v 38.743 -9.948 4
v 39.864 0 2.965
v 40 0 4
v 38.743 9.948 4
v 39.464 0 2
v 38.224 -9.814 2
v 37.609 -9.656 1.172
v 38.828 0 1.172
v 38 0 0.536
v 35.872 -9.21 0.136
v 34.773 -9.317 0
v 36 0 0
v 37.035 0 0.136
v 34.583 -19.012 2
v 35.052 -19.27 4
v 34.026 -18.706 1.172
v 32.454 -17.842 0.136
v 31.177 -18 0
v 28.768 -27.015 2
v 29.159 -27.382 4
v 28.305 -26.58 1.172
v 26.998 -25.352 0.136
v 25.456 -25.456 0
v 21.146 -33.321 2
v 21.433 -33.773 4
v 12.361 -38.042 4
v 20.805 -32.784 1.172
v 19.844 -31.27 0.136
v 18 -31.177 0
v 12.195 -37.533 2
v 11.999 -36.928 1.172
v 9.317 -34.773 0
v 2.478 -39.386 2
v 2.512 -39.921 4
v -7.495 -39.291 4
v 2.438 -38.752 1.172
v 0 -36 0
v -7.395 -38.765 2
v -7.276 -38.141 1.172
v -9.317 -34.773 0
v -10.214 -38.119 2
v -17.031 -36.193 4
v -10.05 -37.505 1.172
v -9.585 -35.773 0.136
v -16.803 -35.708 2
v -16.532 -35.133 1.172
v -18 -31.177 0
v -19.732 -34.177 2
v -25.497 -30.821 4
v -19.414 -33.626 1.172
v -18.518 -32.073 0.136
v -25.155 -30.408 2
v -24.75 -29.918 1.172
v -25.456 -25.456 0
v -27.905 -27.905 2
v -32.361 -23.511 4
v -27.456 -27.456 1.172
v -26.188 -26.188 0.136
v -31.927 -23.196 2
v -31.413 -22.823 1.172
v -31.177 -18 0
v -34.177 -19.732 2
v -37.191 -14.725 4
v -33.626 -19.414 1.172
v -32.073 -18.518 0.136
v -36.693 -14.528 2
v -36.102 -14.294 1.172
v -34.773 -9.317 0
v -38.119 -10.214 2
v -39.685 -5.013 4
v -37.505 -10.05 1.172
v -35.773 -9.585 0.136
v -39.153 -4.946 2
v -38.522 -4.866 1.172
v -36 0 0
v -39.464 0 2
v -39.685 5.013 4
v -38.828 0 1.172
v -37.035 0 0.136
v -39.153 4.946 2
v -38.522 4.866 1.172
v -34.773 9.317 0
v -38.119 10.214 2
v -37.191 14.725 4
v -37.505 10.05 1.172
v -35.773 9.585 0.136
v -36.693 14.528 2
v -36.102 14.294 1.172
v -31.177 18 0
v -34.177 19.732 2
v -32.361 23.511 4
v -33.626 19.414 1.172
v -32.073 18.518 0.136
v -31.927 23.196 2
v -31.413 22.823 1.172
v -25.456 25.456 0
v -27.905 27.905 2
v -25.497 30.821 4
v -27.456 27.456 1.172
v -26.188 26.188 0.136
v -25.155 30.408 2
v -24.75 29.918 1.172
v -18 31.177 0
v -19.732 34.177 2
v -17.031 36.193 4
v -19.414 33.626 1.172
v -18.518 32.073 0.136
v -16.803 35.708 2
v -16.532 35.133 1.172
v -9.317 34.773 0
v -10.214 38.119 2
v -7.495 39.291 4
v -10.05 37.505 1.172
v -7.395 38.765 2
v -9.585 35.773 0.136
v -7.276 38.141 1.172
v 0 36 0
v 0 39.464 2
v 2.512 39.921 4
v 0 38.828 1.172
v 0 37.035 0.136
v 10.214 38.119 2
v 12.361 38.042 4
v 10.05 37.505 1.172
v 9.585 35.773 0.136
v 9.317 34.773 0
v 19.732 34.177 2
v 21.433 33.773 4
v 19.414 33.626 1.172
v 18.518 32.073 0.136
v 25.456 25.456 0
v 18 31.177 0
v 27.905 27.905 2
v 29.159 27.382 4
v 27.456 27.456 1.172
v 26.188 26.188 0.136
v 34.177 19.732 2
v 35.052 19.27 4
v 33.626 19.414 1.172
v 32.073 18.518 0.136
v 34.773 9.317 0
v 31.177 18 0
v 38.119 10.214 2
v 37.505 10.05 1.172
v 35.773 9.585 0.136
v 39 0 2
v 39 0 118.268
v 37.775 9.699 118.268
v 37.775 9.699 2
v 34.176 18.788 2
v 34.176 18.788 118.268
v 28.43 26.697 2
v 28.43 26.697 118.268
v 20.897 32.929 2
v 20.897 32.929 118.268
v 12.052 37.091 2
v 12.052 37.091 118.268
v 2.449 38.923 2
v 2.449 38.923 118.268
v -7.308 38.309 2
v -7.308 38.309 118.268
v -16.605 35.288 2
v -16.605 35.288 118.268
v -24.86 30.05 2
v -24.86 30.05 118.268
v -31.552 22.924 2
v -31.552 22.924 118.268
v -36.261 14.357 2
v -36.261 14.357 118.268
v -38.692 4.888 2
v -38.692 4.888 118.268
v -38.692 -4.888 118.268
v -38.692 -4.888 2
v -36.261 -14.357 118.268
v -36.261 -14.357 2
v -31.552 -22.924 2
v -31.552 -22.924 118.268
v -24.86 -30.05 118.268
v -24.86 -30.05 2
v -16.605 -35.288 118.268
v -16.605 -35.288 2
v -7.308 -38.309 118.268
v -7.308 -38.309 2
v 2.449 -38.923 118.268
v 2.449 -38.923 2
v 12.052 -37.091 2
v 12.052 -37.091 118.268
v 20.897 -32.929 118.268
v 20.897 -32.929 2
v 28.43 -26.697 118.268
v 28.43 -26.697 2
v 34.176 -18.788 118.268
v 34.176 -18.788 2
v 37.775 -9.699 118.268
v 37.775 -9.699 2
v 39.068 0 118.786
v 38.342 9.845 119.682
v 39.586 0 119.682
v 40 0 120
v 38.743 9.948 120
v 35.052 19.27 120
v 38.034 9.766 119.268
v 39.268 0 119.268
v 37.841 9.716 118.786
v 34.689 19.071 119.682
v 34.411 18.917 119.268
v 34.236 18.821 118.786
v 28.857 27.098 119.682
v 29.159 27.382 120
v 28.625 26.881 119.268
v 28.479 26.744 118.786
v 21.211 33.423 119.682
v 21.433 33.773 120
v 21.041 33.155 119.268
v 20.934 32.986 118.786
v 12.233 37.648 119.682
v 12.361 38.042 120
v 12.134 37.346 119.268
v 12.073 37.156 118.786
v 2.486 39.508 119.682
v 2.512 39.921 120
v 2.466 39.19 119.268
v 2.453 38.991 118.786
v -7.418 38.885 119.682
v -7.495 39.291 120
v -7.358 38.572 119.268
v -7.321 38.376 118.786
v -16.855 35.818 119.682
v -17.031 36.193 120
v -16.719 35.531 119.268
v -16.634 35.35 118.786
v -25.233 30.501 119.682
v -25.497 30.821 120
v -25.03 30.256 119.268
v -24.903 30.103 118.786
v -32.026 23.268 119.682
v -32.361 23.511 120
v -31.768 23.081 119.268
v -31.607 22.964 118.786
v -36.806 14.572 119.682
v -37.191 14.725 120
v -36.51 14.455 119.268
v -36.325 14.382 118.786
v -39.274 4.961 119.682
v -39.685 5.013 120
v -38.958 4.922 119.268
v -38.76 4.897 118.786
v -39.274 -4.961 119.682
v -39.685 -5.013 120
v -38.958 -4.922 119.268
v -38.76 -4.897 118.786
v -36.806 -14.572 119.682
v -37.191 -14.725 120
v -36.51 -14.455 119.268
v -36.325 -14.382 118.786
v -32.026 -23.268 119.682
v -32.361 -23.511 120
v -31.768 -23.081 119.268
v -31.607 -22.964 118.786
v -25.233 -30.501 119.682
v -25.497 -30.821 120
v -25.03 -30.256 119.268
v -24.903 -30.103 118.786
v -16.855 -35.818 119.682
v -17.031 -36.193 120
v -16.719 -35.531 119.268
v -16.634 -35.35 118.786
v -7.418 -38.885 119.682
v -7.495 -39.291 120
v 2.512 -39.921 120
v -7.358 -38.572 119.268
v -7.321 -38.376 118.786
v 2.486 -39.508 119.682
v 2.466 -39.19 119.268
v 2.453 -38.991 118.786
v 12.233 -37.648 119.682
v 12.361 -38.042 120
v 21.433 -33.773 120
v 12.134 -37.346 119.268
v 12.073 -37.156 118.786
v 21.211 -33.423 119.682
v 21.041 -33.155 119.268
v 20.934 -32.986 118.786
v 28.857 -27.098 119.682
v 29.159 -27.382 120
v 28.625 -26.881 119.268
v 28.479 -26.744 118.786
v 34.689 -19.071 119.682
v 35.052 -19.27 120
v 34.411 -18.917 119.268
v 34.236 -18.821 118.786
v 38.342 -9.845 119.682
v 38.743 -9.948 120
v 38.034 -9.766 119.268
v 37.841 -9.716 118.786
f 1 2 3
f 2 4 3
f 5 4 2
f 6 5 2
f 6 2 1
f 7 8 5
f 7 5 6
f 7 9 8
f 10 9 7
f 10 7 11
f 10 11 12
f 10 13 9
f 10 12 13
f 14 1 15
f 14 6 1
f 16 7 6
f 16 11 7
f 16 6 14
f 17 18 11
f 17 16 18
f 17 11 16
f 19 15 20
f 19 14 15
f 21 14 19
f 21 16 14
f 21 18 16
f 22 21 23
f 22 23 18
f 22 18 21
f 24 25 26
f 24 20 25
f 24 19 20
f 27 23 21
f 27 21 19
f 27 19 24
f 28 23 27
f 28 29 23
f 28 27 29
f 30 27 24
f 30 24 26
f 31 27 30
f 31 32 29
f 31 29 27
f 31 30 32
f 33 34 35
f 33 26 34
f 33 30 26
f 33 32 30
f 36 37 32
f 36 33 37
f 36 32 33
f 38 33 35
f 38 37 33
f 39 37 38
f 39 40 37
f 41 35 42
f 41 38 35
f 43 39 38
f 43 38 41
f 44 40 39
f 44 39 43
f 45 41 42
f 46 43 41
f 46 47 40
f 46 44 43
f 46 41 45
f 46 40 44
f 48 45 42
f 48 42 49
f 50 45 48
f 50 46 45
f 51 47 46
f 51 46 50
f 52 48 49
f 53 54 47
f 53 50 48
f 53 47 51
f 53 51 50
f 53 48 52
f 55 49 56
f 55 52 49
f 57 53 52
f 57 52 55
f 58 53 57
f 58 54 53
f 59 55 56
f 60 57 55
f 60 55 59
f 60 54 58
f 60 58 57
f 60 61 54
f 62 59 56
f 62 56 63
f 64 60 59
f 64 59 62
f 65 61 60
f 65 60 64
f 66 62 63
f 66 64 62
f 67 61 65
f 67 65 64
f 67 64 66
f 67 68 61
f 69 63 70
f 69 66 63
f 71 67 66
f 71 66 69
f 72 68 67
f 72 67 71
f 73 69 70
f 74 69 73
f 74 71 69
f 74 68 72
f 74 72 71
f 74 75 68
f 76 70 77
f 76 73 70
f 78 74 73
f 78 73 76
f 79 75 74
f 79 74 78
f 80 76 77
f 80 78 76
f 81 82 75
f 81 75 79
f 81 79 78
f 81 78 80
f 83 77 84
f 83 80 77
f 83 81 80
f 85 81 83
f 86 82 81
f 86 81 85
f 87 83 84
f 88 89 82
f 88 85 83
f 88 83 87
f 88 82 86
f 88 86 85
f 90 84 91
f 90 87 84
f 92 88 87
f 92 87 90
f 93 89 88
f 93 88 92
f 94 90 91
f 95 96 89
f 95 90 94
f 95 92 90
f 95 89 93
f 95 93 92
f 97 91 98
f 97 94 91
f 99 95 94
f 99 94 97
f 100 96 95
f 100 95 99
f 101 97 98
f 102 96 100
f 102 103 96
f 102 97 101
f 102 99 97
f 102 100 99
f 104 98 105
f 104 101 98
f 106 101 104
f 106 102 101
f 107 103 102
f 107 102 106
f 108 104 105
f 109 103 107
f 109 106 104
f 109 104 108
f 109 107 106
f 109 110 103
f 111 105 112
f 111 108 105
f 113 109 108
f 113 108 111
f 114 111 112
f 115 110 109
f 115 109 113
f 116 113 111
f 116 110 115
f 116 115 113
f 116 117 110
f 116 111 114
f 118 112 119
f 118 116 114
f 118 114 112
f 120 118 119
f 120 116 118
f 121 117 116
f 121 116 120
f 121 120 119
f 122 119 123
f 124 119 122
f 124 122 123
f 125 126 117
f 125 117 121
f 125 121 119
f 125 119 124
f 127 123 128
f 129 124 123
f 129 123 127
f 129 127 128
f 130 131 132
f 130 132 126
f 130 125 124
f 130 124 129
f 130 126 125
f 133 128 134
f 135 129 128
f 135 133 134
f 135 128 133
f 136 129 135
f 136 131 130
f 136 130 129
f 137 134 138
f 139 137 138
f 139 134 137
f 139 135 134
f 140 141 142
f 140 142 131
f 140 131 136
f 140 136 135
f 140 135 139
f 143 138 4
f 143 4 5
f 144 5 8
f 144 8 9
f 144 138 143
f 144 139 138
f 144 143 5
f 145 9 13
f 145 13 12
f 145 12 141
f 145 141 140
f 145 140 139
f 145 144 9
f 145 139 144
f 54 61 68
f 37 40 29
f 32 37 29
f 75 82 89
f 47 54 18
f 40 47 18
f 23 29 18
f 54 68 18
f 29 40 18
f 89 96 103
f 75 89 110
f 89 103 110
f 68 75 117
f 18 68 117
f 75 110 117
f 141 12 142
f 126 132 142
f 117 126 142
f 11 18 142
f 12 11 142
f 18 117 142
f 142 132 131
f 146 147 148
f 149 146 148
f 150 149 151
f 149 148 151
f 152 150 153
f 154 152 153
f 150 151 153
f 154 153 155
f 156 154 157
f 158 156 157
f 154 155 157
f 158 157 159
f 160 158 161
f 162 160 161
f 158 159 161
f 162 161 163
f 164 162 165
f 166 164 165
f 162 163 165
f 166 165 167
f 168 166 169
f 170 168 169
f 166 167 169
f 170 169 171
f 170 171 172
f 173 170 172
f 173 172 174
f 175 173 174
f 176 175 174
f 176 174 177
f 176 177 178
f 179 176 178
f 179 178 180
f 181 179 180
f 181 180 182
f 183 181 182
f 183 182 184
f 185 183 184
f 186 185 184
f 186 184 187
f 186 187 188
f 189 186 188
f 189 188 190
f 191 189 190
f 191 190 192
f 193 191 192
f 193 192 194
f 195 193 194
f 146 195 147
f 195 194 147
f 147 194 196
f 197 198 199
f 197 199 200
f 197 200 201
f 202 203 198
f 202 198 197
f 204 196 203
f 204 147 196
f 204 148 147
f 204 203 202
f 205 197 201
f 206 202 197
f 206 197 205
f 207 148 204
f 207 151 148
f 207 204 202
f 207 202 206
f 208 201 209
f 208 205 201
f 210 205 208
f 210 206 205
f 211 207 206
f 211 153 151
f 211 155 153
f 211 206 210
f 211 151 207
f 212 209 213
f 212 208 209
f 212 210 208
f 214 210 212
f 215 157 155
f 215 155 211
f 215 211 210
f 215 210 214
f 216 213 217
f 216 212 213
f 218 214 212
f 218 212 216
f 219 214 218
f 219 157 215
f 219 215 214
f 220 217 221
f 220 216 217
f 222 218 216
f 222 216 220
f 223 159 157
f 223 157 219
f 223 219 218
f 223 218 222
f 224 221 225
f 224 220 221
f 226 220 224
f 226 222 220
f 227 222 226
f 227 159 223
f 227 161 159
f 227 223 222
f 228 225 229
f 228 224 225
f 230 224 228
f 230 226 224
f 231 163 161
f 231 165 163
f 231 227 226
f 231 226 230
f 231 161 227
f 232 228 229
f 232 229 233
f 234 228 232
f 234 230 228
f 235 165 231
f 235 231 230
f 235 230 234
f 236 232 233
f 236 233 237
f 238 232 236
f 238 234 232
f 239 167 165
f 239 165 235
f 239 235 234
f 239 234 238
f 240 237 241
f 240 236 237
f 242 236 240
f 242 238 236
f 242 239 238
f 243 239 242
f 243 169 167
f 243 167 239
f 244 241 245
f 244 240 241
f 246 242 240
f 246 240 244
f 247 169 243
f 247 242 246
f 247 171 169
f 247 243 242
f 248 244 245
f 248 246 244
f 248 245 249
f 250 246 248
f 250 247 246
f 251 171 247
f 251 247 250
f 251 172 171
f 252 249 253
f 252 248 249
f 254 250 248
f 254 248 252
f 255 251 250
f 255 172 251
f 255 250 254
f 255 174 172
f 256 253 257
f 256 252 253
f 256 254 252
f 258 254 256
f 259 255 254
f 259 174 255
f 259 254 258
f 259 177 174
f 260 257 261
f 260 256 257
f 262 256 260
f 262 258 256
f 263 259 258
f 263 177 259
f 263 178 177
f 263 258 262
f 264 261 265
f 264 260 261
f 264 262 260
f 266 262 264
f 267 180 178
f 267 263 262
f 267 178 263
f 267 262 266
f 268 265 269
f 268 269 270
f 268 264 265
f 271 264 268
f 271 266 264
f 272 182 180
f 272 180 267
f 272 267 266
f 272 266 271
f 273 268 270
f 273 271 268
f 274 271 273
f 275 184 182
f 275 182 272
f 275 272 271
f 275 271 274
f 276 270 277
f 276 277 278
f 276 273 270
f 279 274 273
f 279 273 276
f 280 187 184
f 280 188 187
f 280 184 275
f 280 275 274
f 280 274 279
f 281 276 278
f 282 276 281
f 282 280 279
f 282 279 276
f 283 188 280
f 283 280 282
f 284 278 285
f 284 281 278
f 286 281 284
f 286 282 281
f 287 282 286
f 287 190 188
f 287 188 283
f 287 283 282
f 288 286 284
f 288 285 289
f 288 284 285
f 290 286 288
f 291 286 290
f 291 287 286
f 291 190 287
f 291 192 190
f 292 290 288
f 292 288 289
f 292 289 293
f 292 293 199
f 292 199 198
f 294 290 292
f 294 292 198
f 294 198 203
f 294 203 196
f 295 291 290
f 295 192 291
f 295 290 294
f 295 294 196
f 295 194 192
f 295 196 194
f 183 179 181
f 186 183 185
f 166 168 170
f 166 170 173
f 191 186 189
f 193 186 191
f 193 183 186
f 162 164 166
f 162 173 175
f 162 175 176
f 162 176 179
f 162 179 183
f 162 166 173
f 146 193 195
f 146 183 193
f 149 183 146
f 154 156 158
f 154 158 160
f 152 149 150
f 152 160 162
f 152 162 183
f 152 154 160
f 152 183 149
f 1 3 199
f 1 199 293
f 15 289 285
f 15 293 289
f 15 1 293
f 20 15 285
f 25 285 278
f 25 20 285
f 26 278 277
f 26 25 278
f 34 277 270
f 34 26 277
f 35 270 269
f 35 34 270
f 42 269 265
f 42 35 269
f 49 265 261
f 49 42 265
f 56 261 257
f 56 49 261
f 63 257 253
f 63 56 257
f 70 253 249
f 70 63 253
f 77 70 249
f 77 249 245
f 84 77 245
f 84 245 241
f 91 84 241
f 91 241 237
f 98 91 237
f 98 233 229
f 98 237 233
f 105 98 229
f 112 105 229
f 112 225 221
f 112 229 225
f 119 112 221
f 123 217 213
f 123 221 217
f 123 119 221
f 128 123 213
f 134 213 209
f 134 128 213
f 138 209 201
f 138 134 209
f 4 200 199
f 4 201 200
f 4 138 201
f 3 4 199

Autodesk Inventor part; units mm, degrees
ref_plane "YZ Plane" through (0, 0, 0) normal (1, 0, 0) x (0, 1, 0)
ref_plane "XZ Plane" through (0, 0, 0) normal (0, 1, 0) x (-1, 0, 0)
ref_plane "XY Plane" through (0, 0, 0) normal (0, 0, 1) x (1, 0, 0)
sketch "Sketch1" plane through (0, 0, 0) normal (0, 0, 1) x (1, 0, 0)
  circle A0 centre (0, 0) radius 40
  dimension "d0" = 80
extrude "Extrusion1" add sketch "Sketch1" along normal blind 120
sketch "Sketch2" plane through (0, 0, 120) normal (0, 0, 1) x (1, 0, 0)
  circle A0 centre (0, 0) radius 39
  dimension "d3" = 78
extrude "Extrusion2" cut sketch "Sketch2" against normal blind 118
fillet "Fillet1" radius 4 1 edges at (-40, 0, 0)
fillet "Fillet2" radius 2 1 edges at (-39, 0, 120)
properties part number "beaker1"
